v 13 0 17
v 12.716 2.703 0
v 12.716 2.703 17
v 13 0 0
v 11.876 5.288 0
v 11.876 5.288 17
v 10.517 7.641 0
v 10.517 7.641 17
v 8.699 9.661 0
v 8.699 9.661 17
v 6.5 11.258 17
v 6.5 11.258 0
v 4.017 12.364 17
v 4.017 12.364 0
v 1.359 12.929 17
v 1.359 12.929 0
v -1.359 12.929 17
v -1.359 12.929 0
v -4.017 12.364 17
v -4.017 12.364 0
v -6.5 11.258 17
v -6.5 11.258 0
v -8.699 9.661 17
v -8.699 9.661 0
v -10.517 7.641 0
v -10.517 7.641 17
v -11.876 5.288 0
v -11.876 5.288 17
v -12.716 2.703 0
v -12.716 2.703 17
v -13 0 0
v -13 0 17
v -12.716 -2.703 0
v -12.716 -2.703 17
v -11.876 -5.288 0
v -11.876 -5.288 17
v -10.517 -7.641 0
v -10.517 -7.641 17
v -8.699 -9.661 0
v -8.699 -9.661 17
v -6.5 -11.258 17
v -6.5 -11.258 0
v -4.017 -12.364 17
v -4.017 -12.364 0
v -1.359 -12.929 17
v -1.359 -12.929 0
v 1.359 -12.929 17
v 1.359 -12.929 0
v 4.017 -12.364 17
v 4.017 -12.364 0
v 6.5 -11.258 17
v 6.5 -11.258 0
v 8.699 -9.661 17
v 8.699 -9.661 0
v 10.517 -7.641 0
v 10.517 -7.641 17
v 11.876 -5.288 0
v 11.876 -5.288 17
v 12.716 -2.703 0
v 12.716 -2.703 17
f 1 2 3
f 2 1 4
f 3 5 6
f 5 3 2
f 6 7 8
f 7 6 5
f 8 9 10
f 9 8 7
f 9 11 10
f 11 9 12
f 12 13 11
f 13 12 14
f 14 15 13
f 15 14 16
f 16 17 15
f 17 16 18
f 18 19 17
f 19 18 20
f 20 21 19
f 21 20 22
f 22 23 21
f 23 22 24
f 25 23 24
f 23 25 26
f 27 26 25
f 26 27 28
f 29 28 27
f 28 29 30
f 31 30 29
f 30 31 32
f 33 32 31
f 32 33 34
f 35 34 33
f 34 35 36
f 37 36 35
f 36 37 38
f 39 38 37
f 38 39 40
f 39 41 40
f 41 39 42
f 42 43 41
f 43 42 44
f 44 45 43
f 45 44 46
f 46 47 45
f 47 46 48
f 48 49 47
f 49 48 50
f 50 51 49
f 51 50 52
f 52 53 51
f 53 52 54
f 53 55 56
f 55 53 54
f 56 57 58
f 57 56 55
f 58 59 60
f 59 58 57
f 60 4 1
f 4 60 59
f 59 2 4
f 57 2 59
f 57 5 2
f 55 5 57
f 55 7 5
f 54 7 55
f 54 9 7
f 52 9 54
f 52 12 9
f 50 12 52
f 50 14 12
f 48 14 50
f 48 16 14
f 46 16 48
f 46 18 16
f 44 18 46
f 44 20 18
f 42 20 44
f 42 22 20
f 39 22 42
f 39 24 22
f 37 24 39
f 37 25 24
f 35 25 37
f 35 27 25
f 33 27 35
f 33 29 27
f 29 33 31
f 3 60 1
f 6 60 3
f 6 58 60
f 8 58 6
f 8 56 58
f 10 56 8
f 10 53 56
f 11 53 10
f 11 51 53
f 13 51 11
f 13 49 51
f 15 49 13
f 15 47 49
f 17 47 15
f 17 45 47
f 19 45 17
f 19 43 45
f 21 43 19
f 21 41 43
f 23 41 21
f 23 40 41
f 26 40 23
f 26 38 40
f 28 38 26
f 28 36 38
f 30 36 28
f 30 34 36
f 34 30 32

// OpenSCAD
// Generated by SolidPython 1.0.1 on 2020-07-29 00:46:45


cylinder(h = 17, r1 = 13, r2 = 13);
/***********************************************
*********      SolidPython code:      **********
************************************************
 
# import packages: SolidPython
from solid import *
from solid.utils import *
from itertools import chain, combinations, permutations


class Resize:

    def __init__(self, scad_file):
        self.scad_file = scad_file
        #self.scad_file = import_scad(scad_file)
        # cone/cylinder param:
        self.r1 = 0
        self.r2 = 0
        self.h = 0
        # rectangular prism param:
        self.w = 0
        self.l = 0
        # ellipse param:
        self.r = 0

    # import OpenScad code (file name corresponds to shape)


    # classify shape + parameters
    def assign(self, param1, param2, param3):
        if self.scad_file == 'cone.scad':
            self.r1 = param1
            self.r2 = param2
            self.h = param3
        elif self.scad_file == 'cylinder.scad':
            self.r1 = param1
            self.r2 = param2
            self.h = param3
        elif self.scad_file == 'rectangularPrism.scad':
            self.h = param1
            self.l = param2
            self.w = param3
        else:
            self.r = param1
            self.h = param2

    # resize parameters
    def iterate(self):
        x = range(3, 20, 2)
        i = 1
        if self.scad_file == 'cone.scad':
            tempList = list(permutations(x, 2))
            for temp in tempList:
                param1 = temp[0]
                param2 = temp[1]
                filepath = 'produced_scad_files/' + 'cone' + str(param1) + '_' + str(param2) + '_' + '.scad'
                scad_render_to_file(cylinder(h=param1, r1=param2, r2=0), filepath)

        elif self.scad_file == 'cylinder.scad':
            tempList = list(permutations(x, 3))
            for temp in tempList:
                param1 = temp[0]
                param2 = temp[1]
                filepath = 'produced_scad_files/' + 'cylinder' + str(param1) + '_' + str(param2) + '_' + '.scad'
                scad_render_to_file(cylinder(h=param1, r1=param2, r2=param2), filepath)

        elif self.scad_file == 'rectangularPrism.scad':
            tempList = list(permutations(x, 3))
            for temp in tempList:
                param1 = temp[0]
                param2 = temp[1]
                param3 = temp[2]
                filepath = 'produced_scad_files/' + 'rectangularPrism' + str(param1) + '_' + str(param2) + '_' + str(
                    param3) + '.scad'
                scad_render_to_file(cube(size=(param1, param2, param3)), filepath)

        elif self.scad_file == 'ellipse.scad':
            tempList = list(permutations(x, 4))
            for temp in tempList:
                param1 = temp[0]
                param2 = temp[1]
                param3 = temp[2]
                param4 = temp[3]
                filepath = 'produced_scad_files/' + 'ellipse' + str(param1) + '_' + str(param2) + '_' + str(param3) + '_' + str(param4) + '.scad'
                scad_render_to_file(scale([param1, param2, param3])(sphere(r=param4)), filepath)

    def render_to_scadfile(self):
        scad_render_to_file(scad, 'example.scad') 
 
************************************************/
